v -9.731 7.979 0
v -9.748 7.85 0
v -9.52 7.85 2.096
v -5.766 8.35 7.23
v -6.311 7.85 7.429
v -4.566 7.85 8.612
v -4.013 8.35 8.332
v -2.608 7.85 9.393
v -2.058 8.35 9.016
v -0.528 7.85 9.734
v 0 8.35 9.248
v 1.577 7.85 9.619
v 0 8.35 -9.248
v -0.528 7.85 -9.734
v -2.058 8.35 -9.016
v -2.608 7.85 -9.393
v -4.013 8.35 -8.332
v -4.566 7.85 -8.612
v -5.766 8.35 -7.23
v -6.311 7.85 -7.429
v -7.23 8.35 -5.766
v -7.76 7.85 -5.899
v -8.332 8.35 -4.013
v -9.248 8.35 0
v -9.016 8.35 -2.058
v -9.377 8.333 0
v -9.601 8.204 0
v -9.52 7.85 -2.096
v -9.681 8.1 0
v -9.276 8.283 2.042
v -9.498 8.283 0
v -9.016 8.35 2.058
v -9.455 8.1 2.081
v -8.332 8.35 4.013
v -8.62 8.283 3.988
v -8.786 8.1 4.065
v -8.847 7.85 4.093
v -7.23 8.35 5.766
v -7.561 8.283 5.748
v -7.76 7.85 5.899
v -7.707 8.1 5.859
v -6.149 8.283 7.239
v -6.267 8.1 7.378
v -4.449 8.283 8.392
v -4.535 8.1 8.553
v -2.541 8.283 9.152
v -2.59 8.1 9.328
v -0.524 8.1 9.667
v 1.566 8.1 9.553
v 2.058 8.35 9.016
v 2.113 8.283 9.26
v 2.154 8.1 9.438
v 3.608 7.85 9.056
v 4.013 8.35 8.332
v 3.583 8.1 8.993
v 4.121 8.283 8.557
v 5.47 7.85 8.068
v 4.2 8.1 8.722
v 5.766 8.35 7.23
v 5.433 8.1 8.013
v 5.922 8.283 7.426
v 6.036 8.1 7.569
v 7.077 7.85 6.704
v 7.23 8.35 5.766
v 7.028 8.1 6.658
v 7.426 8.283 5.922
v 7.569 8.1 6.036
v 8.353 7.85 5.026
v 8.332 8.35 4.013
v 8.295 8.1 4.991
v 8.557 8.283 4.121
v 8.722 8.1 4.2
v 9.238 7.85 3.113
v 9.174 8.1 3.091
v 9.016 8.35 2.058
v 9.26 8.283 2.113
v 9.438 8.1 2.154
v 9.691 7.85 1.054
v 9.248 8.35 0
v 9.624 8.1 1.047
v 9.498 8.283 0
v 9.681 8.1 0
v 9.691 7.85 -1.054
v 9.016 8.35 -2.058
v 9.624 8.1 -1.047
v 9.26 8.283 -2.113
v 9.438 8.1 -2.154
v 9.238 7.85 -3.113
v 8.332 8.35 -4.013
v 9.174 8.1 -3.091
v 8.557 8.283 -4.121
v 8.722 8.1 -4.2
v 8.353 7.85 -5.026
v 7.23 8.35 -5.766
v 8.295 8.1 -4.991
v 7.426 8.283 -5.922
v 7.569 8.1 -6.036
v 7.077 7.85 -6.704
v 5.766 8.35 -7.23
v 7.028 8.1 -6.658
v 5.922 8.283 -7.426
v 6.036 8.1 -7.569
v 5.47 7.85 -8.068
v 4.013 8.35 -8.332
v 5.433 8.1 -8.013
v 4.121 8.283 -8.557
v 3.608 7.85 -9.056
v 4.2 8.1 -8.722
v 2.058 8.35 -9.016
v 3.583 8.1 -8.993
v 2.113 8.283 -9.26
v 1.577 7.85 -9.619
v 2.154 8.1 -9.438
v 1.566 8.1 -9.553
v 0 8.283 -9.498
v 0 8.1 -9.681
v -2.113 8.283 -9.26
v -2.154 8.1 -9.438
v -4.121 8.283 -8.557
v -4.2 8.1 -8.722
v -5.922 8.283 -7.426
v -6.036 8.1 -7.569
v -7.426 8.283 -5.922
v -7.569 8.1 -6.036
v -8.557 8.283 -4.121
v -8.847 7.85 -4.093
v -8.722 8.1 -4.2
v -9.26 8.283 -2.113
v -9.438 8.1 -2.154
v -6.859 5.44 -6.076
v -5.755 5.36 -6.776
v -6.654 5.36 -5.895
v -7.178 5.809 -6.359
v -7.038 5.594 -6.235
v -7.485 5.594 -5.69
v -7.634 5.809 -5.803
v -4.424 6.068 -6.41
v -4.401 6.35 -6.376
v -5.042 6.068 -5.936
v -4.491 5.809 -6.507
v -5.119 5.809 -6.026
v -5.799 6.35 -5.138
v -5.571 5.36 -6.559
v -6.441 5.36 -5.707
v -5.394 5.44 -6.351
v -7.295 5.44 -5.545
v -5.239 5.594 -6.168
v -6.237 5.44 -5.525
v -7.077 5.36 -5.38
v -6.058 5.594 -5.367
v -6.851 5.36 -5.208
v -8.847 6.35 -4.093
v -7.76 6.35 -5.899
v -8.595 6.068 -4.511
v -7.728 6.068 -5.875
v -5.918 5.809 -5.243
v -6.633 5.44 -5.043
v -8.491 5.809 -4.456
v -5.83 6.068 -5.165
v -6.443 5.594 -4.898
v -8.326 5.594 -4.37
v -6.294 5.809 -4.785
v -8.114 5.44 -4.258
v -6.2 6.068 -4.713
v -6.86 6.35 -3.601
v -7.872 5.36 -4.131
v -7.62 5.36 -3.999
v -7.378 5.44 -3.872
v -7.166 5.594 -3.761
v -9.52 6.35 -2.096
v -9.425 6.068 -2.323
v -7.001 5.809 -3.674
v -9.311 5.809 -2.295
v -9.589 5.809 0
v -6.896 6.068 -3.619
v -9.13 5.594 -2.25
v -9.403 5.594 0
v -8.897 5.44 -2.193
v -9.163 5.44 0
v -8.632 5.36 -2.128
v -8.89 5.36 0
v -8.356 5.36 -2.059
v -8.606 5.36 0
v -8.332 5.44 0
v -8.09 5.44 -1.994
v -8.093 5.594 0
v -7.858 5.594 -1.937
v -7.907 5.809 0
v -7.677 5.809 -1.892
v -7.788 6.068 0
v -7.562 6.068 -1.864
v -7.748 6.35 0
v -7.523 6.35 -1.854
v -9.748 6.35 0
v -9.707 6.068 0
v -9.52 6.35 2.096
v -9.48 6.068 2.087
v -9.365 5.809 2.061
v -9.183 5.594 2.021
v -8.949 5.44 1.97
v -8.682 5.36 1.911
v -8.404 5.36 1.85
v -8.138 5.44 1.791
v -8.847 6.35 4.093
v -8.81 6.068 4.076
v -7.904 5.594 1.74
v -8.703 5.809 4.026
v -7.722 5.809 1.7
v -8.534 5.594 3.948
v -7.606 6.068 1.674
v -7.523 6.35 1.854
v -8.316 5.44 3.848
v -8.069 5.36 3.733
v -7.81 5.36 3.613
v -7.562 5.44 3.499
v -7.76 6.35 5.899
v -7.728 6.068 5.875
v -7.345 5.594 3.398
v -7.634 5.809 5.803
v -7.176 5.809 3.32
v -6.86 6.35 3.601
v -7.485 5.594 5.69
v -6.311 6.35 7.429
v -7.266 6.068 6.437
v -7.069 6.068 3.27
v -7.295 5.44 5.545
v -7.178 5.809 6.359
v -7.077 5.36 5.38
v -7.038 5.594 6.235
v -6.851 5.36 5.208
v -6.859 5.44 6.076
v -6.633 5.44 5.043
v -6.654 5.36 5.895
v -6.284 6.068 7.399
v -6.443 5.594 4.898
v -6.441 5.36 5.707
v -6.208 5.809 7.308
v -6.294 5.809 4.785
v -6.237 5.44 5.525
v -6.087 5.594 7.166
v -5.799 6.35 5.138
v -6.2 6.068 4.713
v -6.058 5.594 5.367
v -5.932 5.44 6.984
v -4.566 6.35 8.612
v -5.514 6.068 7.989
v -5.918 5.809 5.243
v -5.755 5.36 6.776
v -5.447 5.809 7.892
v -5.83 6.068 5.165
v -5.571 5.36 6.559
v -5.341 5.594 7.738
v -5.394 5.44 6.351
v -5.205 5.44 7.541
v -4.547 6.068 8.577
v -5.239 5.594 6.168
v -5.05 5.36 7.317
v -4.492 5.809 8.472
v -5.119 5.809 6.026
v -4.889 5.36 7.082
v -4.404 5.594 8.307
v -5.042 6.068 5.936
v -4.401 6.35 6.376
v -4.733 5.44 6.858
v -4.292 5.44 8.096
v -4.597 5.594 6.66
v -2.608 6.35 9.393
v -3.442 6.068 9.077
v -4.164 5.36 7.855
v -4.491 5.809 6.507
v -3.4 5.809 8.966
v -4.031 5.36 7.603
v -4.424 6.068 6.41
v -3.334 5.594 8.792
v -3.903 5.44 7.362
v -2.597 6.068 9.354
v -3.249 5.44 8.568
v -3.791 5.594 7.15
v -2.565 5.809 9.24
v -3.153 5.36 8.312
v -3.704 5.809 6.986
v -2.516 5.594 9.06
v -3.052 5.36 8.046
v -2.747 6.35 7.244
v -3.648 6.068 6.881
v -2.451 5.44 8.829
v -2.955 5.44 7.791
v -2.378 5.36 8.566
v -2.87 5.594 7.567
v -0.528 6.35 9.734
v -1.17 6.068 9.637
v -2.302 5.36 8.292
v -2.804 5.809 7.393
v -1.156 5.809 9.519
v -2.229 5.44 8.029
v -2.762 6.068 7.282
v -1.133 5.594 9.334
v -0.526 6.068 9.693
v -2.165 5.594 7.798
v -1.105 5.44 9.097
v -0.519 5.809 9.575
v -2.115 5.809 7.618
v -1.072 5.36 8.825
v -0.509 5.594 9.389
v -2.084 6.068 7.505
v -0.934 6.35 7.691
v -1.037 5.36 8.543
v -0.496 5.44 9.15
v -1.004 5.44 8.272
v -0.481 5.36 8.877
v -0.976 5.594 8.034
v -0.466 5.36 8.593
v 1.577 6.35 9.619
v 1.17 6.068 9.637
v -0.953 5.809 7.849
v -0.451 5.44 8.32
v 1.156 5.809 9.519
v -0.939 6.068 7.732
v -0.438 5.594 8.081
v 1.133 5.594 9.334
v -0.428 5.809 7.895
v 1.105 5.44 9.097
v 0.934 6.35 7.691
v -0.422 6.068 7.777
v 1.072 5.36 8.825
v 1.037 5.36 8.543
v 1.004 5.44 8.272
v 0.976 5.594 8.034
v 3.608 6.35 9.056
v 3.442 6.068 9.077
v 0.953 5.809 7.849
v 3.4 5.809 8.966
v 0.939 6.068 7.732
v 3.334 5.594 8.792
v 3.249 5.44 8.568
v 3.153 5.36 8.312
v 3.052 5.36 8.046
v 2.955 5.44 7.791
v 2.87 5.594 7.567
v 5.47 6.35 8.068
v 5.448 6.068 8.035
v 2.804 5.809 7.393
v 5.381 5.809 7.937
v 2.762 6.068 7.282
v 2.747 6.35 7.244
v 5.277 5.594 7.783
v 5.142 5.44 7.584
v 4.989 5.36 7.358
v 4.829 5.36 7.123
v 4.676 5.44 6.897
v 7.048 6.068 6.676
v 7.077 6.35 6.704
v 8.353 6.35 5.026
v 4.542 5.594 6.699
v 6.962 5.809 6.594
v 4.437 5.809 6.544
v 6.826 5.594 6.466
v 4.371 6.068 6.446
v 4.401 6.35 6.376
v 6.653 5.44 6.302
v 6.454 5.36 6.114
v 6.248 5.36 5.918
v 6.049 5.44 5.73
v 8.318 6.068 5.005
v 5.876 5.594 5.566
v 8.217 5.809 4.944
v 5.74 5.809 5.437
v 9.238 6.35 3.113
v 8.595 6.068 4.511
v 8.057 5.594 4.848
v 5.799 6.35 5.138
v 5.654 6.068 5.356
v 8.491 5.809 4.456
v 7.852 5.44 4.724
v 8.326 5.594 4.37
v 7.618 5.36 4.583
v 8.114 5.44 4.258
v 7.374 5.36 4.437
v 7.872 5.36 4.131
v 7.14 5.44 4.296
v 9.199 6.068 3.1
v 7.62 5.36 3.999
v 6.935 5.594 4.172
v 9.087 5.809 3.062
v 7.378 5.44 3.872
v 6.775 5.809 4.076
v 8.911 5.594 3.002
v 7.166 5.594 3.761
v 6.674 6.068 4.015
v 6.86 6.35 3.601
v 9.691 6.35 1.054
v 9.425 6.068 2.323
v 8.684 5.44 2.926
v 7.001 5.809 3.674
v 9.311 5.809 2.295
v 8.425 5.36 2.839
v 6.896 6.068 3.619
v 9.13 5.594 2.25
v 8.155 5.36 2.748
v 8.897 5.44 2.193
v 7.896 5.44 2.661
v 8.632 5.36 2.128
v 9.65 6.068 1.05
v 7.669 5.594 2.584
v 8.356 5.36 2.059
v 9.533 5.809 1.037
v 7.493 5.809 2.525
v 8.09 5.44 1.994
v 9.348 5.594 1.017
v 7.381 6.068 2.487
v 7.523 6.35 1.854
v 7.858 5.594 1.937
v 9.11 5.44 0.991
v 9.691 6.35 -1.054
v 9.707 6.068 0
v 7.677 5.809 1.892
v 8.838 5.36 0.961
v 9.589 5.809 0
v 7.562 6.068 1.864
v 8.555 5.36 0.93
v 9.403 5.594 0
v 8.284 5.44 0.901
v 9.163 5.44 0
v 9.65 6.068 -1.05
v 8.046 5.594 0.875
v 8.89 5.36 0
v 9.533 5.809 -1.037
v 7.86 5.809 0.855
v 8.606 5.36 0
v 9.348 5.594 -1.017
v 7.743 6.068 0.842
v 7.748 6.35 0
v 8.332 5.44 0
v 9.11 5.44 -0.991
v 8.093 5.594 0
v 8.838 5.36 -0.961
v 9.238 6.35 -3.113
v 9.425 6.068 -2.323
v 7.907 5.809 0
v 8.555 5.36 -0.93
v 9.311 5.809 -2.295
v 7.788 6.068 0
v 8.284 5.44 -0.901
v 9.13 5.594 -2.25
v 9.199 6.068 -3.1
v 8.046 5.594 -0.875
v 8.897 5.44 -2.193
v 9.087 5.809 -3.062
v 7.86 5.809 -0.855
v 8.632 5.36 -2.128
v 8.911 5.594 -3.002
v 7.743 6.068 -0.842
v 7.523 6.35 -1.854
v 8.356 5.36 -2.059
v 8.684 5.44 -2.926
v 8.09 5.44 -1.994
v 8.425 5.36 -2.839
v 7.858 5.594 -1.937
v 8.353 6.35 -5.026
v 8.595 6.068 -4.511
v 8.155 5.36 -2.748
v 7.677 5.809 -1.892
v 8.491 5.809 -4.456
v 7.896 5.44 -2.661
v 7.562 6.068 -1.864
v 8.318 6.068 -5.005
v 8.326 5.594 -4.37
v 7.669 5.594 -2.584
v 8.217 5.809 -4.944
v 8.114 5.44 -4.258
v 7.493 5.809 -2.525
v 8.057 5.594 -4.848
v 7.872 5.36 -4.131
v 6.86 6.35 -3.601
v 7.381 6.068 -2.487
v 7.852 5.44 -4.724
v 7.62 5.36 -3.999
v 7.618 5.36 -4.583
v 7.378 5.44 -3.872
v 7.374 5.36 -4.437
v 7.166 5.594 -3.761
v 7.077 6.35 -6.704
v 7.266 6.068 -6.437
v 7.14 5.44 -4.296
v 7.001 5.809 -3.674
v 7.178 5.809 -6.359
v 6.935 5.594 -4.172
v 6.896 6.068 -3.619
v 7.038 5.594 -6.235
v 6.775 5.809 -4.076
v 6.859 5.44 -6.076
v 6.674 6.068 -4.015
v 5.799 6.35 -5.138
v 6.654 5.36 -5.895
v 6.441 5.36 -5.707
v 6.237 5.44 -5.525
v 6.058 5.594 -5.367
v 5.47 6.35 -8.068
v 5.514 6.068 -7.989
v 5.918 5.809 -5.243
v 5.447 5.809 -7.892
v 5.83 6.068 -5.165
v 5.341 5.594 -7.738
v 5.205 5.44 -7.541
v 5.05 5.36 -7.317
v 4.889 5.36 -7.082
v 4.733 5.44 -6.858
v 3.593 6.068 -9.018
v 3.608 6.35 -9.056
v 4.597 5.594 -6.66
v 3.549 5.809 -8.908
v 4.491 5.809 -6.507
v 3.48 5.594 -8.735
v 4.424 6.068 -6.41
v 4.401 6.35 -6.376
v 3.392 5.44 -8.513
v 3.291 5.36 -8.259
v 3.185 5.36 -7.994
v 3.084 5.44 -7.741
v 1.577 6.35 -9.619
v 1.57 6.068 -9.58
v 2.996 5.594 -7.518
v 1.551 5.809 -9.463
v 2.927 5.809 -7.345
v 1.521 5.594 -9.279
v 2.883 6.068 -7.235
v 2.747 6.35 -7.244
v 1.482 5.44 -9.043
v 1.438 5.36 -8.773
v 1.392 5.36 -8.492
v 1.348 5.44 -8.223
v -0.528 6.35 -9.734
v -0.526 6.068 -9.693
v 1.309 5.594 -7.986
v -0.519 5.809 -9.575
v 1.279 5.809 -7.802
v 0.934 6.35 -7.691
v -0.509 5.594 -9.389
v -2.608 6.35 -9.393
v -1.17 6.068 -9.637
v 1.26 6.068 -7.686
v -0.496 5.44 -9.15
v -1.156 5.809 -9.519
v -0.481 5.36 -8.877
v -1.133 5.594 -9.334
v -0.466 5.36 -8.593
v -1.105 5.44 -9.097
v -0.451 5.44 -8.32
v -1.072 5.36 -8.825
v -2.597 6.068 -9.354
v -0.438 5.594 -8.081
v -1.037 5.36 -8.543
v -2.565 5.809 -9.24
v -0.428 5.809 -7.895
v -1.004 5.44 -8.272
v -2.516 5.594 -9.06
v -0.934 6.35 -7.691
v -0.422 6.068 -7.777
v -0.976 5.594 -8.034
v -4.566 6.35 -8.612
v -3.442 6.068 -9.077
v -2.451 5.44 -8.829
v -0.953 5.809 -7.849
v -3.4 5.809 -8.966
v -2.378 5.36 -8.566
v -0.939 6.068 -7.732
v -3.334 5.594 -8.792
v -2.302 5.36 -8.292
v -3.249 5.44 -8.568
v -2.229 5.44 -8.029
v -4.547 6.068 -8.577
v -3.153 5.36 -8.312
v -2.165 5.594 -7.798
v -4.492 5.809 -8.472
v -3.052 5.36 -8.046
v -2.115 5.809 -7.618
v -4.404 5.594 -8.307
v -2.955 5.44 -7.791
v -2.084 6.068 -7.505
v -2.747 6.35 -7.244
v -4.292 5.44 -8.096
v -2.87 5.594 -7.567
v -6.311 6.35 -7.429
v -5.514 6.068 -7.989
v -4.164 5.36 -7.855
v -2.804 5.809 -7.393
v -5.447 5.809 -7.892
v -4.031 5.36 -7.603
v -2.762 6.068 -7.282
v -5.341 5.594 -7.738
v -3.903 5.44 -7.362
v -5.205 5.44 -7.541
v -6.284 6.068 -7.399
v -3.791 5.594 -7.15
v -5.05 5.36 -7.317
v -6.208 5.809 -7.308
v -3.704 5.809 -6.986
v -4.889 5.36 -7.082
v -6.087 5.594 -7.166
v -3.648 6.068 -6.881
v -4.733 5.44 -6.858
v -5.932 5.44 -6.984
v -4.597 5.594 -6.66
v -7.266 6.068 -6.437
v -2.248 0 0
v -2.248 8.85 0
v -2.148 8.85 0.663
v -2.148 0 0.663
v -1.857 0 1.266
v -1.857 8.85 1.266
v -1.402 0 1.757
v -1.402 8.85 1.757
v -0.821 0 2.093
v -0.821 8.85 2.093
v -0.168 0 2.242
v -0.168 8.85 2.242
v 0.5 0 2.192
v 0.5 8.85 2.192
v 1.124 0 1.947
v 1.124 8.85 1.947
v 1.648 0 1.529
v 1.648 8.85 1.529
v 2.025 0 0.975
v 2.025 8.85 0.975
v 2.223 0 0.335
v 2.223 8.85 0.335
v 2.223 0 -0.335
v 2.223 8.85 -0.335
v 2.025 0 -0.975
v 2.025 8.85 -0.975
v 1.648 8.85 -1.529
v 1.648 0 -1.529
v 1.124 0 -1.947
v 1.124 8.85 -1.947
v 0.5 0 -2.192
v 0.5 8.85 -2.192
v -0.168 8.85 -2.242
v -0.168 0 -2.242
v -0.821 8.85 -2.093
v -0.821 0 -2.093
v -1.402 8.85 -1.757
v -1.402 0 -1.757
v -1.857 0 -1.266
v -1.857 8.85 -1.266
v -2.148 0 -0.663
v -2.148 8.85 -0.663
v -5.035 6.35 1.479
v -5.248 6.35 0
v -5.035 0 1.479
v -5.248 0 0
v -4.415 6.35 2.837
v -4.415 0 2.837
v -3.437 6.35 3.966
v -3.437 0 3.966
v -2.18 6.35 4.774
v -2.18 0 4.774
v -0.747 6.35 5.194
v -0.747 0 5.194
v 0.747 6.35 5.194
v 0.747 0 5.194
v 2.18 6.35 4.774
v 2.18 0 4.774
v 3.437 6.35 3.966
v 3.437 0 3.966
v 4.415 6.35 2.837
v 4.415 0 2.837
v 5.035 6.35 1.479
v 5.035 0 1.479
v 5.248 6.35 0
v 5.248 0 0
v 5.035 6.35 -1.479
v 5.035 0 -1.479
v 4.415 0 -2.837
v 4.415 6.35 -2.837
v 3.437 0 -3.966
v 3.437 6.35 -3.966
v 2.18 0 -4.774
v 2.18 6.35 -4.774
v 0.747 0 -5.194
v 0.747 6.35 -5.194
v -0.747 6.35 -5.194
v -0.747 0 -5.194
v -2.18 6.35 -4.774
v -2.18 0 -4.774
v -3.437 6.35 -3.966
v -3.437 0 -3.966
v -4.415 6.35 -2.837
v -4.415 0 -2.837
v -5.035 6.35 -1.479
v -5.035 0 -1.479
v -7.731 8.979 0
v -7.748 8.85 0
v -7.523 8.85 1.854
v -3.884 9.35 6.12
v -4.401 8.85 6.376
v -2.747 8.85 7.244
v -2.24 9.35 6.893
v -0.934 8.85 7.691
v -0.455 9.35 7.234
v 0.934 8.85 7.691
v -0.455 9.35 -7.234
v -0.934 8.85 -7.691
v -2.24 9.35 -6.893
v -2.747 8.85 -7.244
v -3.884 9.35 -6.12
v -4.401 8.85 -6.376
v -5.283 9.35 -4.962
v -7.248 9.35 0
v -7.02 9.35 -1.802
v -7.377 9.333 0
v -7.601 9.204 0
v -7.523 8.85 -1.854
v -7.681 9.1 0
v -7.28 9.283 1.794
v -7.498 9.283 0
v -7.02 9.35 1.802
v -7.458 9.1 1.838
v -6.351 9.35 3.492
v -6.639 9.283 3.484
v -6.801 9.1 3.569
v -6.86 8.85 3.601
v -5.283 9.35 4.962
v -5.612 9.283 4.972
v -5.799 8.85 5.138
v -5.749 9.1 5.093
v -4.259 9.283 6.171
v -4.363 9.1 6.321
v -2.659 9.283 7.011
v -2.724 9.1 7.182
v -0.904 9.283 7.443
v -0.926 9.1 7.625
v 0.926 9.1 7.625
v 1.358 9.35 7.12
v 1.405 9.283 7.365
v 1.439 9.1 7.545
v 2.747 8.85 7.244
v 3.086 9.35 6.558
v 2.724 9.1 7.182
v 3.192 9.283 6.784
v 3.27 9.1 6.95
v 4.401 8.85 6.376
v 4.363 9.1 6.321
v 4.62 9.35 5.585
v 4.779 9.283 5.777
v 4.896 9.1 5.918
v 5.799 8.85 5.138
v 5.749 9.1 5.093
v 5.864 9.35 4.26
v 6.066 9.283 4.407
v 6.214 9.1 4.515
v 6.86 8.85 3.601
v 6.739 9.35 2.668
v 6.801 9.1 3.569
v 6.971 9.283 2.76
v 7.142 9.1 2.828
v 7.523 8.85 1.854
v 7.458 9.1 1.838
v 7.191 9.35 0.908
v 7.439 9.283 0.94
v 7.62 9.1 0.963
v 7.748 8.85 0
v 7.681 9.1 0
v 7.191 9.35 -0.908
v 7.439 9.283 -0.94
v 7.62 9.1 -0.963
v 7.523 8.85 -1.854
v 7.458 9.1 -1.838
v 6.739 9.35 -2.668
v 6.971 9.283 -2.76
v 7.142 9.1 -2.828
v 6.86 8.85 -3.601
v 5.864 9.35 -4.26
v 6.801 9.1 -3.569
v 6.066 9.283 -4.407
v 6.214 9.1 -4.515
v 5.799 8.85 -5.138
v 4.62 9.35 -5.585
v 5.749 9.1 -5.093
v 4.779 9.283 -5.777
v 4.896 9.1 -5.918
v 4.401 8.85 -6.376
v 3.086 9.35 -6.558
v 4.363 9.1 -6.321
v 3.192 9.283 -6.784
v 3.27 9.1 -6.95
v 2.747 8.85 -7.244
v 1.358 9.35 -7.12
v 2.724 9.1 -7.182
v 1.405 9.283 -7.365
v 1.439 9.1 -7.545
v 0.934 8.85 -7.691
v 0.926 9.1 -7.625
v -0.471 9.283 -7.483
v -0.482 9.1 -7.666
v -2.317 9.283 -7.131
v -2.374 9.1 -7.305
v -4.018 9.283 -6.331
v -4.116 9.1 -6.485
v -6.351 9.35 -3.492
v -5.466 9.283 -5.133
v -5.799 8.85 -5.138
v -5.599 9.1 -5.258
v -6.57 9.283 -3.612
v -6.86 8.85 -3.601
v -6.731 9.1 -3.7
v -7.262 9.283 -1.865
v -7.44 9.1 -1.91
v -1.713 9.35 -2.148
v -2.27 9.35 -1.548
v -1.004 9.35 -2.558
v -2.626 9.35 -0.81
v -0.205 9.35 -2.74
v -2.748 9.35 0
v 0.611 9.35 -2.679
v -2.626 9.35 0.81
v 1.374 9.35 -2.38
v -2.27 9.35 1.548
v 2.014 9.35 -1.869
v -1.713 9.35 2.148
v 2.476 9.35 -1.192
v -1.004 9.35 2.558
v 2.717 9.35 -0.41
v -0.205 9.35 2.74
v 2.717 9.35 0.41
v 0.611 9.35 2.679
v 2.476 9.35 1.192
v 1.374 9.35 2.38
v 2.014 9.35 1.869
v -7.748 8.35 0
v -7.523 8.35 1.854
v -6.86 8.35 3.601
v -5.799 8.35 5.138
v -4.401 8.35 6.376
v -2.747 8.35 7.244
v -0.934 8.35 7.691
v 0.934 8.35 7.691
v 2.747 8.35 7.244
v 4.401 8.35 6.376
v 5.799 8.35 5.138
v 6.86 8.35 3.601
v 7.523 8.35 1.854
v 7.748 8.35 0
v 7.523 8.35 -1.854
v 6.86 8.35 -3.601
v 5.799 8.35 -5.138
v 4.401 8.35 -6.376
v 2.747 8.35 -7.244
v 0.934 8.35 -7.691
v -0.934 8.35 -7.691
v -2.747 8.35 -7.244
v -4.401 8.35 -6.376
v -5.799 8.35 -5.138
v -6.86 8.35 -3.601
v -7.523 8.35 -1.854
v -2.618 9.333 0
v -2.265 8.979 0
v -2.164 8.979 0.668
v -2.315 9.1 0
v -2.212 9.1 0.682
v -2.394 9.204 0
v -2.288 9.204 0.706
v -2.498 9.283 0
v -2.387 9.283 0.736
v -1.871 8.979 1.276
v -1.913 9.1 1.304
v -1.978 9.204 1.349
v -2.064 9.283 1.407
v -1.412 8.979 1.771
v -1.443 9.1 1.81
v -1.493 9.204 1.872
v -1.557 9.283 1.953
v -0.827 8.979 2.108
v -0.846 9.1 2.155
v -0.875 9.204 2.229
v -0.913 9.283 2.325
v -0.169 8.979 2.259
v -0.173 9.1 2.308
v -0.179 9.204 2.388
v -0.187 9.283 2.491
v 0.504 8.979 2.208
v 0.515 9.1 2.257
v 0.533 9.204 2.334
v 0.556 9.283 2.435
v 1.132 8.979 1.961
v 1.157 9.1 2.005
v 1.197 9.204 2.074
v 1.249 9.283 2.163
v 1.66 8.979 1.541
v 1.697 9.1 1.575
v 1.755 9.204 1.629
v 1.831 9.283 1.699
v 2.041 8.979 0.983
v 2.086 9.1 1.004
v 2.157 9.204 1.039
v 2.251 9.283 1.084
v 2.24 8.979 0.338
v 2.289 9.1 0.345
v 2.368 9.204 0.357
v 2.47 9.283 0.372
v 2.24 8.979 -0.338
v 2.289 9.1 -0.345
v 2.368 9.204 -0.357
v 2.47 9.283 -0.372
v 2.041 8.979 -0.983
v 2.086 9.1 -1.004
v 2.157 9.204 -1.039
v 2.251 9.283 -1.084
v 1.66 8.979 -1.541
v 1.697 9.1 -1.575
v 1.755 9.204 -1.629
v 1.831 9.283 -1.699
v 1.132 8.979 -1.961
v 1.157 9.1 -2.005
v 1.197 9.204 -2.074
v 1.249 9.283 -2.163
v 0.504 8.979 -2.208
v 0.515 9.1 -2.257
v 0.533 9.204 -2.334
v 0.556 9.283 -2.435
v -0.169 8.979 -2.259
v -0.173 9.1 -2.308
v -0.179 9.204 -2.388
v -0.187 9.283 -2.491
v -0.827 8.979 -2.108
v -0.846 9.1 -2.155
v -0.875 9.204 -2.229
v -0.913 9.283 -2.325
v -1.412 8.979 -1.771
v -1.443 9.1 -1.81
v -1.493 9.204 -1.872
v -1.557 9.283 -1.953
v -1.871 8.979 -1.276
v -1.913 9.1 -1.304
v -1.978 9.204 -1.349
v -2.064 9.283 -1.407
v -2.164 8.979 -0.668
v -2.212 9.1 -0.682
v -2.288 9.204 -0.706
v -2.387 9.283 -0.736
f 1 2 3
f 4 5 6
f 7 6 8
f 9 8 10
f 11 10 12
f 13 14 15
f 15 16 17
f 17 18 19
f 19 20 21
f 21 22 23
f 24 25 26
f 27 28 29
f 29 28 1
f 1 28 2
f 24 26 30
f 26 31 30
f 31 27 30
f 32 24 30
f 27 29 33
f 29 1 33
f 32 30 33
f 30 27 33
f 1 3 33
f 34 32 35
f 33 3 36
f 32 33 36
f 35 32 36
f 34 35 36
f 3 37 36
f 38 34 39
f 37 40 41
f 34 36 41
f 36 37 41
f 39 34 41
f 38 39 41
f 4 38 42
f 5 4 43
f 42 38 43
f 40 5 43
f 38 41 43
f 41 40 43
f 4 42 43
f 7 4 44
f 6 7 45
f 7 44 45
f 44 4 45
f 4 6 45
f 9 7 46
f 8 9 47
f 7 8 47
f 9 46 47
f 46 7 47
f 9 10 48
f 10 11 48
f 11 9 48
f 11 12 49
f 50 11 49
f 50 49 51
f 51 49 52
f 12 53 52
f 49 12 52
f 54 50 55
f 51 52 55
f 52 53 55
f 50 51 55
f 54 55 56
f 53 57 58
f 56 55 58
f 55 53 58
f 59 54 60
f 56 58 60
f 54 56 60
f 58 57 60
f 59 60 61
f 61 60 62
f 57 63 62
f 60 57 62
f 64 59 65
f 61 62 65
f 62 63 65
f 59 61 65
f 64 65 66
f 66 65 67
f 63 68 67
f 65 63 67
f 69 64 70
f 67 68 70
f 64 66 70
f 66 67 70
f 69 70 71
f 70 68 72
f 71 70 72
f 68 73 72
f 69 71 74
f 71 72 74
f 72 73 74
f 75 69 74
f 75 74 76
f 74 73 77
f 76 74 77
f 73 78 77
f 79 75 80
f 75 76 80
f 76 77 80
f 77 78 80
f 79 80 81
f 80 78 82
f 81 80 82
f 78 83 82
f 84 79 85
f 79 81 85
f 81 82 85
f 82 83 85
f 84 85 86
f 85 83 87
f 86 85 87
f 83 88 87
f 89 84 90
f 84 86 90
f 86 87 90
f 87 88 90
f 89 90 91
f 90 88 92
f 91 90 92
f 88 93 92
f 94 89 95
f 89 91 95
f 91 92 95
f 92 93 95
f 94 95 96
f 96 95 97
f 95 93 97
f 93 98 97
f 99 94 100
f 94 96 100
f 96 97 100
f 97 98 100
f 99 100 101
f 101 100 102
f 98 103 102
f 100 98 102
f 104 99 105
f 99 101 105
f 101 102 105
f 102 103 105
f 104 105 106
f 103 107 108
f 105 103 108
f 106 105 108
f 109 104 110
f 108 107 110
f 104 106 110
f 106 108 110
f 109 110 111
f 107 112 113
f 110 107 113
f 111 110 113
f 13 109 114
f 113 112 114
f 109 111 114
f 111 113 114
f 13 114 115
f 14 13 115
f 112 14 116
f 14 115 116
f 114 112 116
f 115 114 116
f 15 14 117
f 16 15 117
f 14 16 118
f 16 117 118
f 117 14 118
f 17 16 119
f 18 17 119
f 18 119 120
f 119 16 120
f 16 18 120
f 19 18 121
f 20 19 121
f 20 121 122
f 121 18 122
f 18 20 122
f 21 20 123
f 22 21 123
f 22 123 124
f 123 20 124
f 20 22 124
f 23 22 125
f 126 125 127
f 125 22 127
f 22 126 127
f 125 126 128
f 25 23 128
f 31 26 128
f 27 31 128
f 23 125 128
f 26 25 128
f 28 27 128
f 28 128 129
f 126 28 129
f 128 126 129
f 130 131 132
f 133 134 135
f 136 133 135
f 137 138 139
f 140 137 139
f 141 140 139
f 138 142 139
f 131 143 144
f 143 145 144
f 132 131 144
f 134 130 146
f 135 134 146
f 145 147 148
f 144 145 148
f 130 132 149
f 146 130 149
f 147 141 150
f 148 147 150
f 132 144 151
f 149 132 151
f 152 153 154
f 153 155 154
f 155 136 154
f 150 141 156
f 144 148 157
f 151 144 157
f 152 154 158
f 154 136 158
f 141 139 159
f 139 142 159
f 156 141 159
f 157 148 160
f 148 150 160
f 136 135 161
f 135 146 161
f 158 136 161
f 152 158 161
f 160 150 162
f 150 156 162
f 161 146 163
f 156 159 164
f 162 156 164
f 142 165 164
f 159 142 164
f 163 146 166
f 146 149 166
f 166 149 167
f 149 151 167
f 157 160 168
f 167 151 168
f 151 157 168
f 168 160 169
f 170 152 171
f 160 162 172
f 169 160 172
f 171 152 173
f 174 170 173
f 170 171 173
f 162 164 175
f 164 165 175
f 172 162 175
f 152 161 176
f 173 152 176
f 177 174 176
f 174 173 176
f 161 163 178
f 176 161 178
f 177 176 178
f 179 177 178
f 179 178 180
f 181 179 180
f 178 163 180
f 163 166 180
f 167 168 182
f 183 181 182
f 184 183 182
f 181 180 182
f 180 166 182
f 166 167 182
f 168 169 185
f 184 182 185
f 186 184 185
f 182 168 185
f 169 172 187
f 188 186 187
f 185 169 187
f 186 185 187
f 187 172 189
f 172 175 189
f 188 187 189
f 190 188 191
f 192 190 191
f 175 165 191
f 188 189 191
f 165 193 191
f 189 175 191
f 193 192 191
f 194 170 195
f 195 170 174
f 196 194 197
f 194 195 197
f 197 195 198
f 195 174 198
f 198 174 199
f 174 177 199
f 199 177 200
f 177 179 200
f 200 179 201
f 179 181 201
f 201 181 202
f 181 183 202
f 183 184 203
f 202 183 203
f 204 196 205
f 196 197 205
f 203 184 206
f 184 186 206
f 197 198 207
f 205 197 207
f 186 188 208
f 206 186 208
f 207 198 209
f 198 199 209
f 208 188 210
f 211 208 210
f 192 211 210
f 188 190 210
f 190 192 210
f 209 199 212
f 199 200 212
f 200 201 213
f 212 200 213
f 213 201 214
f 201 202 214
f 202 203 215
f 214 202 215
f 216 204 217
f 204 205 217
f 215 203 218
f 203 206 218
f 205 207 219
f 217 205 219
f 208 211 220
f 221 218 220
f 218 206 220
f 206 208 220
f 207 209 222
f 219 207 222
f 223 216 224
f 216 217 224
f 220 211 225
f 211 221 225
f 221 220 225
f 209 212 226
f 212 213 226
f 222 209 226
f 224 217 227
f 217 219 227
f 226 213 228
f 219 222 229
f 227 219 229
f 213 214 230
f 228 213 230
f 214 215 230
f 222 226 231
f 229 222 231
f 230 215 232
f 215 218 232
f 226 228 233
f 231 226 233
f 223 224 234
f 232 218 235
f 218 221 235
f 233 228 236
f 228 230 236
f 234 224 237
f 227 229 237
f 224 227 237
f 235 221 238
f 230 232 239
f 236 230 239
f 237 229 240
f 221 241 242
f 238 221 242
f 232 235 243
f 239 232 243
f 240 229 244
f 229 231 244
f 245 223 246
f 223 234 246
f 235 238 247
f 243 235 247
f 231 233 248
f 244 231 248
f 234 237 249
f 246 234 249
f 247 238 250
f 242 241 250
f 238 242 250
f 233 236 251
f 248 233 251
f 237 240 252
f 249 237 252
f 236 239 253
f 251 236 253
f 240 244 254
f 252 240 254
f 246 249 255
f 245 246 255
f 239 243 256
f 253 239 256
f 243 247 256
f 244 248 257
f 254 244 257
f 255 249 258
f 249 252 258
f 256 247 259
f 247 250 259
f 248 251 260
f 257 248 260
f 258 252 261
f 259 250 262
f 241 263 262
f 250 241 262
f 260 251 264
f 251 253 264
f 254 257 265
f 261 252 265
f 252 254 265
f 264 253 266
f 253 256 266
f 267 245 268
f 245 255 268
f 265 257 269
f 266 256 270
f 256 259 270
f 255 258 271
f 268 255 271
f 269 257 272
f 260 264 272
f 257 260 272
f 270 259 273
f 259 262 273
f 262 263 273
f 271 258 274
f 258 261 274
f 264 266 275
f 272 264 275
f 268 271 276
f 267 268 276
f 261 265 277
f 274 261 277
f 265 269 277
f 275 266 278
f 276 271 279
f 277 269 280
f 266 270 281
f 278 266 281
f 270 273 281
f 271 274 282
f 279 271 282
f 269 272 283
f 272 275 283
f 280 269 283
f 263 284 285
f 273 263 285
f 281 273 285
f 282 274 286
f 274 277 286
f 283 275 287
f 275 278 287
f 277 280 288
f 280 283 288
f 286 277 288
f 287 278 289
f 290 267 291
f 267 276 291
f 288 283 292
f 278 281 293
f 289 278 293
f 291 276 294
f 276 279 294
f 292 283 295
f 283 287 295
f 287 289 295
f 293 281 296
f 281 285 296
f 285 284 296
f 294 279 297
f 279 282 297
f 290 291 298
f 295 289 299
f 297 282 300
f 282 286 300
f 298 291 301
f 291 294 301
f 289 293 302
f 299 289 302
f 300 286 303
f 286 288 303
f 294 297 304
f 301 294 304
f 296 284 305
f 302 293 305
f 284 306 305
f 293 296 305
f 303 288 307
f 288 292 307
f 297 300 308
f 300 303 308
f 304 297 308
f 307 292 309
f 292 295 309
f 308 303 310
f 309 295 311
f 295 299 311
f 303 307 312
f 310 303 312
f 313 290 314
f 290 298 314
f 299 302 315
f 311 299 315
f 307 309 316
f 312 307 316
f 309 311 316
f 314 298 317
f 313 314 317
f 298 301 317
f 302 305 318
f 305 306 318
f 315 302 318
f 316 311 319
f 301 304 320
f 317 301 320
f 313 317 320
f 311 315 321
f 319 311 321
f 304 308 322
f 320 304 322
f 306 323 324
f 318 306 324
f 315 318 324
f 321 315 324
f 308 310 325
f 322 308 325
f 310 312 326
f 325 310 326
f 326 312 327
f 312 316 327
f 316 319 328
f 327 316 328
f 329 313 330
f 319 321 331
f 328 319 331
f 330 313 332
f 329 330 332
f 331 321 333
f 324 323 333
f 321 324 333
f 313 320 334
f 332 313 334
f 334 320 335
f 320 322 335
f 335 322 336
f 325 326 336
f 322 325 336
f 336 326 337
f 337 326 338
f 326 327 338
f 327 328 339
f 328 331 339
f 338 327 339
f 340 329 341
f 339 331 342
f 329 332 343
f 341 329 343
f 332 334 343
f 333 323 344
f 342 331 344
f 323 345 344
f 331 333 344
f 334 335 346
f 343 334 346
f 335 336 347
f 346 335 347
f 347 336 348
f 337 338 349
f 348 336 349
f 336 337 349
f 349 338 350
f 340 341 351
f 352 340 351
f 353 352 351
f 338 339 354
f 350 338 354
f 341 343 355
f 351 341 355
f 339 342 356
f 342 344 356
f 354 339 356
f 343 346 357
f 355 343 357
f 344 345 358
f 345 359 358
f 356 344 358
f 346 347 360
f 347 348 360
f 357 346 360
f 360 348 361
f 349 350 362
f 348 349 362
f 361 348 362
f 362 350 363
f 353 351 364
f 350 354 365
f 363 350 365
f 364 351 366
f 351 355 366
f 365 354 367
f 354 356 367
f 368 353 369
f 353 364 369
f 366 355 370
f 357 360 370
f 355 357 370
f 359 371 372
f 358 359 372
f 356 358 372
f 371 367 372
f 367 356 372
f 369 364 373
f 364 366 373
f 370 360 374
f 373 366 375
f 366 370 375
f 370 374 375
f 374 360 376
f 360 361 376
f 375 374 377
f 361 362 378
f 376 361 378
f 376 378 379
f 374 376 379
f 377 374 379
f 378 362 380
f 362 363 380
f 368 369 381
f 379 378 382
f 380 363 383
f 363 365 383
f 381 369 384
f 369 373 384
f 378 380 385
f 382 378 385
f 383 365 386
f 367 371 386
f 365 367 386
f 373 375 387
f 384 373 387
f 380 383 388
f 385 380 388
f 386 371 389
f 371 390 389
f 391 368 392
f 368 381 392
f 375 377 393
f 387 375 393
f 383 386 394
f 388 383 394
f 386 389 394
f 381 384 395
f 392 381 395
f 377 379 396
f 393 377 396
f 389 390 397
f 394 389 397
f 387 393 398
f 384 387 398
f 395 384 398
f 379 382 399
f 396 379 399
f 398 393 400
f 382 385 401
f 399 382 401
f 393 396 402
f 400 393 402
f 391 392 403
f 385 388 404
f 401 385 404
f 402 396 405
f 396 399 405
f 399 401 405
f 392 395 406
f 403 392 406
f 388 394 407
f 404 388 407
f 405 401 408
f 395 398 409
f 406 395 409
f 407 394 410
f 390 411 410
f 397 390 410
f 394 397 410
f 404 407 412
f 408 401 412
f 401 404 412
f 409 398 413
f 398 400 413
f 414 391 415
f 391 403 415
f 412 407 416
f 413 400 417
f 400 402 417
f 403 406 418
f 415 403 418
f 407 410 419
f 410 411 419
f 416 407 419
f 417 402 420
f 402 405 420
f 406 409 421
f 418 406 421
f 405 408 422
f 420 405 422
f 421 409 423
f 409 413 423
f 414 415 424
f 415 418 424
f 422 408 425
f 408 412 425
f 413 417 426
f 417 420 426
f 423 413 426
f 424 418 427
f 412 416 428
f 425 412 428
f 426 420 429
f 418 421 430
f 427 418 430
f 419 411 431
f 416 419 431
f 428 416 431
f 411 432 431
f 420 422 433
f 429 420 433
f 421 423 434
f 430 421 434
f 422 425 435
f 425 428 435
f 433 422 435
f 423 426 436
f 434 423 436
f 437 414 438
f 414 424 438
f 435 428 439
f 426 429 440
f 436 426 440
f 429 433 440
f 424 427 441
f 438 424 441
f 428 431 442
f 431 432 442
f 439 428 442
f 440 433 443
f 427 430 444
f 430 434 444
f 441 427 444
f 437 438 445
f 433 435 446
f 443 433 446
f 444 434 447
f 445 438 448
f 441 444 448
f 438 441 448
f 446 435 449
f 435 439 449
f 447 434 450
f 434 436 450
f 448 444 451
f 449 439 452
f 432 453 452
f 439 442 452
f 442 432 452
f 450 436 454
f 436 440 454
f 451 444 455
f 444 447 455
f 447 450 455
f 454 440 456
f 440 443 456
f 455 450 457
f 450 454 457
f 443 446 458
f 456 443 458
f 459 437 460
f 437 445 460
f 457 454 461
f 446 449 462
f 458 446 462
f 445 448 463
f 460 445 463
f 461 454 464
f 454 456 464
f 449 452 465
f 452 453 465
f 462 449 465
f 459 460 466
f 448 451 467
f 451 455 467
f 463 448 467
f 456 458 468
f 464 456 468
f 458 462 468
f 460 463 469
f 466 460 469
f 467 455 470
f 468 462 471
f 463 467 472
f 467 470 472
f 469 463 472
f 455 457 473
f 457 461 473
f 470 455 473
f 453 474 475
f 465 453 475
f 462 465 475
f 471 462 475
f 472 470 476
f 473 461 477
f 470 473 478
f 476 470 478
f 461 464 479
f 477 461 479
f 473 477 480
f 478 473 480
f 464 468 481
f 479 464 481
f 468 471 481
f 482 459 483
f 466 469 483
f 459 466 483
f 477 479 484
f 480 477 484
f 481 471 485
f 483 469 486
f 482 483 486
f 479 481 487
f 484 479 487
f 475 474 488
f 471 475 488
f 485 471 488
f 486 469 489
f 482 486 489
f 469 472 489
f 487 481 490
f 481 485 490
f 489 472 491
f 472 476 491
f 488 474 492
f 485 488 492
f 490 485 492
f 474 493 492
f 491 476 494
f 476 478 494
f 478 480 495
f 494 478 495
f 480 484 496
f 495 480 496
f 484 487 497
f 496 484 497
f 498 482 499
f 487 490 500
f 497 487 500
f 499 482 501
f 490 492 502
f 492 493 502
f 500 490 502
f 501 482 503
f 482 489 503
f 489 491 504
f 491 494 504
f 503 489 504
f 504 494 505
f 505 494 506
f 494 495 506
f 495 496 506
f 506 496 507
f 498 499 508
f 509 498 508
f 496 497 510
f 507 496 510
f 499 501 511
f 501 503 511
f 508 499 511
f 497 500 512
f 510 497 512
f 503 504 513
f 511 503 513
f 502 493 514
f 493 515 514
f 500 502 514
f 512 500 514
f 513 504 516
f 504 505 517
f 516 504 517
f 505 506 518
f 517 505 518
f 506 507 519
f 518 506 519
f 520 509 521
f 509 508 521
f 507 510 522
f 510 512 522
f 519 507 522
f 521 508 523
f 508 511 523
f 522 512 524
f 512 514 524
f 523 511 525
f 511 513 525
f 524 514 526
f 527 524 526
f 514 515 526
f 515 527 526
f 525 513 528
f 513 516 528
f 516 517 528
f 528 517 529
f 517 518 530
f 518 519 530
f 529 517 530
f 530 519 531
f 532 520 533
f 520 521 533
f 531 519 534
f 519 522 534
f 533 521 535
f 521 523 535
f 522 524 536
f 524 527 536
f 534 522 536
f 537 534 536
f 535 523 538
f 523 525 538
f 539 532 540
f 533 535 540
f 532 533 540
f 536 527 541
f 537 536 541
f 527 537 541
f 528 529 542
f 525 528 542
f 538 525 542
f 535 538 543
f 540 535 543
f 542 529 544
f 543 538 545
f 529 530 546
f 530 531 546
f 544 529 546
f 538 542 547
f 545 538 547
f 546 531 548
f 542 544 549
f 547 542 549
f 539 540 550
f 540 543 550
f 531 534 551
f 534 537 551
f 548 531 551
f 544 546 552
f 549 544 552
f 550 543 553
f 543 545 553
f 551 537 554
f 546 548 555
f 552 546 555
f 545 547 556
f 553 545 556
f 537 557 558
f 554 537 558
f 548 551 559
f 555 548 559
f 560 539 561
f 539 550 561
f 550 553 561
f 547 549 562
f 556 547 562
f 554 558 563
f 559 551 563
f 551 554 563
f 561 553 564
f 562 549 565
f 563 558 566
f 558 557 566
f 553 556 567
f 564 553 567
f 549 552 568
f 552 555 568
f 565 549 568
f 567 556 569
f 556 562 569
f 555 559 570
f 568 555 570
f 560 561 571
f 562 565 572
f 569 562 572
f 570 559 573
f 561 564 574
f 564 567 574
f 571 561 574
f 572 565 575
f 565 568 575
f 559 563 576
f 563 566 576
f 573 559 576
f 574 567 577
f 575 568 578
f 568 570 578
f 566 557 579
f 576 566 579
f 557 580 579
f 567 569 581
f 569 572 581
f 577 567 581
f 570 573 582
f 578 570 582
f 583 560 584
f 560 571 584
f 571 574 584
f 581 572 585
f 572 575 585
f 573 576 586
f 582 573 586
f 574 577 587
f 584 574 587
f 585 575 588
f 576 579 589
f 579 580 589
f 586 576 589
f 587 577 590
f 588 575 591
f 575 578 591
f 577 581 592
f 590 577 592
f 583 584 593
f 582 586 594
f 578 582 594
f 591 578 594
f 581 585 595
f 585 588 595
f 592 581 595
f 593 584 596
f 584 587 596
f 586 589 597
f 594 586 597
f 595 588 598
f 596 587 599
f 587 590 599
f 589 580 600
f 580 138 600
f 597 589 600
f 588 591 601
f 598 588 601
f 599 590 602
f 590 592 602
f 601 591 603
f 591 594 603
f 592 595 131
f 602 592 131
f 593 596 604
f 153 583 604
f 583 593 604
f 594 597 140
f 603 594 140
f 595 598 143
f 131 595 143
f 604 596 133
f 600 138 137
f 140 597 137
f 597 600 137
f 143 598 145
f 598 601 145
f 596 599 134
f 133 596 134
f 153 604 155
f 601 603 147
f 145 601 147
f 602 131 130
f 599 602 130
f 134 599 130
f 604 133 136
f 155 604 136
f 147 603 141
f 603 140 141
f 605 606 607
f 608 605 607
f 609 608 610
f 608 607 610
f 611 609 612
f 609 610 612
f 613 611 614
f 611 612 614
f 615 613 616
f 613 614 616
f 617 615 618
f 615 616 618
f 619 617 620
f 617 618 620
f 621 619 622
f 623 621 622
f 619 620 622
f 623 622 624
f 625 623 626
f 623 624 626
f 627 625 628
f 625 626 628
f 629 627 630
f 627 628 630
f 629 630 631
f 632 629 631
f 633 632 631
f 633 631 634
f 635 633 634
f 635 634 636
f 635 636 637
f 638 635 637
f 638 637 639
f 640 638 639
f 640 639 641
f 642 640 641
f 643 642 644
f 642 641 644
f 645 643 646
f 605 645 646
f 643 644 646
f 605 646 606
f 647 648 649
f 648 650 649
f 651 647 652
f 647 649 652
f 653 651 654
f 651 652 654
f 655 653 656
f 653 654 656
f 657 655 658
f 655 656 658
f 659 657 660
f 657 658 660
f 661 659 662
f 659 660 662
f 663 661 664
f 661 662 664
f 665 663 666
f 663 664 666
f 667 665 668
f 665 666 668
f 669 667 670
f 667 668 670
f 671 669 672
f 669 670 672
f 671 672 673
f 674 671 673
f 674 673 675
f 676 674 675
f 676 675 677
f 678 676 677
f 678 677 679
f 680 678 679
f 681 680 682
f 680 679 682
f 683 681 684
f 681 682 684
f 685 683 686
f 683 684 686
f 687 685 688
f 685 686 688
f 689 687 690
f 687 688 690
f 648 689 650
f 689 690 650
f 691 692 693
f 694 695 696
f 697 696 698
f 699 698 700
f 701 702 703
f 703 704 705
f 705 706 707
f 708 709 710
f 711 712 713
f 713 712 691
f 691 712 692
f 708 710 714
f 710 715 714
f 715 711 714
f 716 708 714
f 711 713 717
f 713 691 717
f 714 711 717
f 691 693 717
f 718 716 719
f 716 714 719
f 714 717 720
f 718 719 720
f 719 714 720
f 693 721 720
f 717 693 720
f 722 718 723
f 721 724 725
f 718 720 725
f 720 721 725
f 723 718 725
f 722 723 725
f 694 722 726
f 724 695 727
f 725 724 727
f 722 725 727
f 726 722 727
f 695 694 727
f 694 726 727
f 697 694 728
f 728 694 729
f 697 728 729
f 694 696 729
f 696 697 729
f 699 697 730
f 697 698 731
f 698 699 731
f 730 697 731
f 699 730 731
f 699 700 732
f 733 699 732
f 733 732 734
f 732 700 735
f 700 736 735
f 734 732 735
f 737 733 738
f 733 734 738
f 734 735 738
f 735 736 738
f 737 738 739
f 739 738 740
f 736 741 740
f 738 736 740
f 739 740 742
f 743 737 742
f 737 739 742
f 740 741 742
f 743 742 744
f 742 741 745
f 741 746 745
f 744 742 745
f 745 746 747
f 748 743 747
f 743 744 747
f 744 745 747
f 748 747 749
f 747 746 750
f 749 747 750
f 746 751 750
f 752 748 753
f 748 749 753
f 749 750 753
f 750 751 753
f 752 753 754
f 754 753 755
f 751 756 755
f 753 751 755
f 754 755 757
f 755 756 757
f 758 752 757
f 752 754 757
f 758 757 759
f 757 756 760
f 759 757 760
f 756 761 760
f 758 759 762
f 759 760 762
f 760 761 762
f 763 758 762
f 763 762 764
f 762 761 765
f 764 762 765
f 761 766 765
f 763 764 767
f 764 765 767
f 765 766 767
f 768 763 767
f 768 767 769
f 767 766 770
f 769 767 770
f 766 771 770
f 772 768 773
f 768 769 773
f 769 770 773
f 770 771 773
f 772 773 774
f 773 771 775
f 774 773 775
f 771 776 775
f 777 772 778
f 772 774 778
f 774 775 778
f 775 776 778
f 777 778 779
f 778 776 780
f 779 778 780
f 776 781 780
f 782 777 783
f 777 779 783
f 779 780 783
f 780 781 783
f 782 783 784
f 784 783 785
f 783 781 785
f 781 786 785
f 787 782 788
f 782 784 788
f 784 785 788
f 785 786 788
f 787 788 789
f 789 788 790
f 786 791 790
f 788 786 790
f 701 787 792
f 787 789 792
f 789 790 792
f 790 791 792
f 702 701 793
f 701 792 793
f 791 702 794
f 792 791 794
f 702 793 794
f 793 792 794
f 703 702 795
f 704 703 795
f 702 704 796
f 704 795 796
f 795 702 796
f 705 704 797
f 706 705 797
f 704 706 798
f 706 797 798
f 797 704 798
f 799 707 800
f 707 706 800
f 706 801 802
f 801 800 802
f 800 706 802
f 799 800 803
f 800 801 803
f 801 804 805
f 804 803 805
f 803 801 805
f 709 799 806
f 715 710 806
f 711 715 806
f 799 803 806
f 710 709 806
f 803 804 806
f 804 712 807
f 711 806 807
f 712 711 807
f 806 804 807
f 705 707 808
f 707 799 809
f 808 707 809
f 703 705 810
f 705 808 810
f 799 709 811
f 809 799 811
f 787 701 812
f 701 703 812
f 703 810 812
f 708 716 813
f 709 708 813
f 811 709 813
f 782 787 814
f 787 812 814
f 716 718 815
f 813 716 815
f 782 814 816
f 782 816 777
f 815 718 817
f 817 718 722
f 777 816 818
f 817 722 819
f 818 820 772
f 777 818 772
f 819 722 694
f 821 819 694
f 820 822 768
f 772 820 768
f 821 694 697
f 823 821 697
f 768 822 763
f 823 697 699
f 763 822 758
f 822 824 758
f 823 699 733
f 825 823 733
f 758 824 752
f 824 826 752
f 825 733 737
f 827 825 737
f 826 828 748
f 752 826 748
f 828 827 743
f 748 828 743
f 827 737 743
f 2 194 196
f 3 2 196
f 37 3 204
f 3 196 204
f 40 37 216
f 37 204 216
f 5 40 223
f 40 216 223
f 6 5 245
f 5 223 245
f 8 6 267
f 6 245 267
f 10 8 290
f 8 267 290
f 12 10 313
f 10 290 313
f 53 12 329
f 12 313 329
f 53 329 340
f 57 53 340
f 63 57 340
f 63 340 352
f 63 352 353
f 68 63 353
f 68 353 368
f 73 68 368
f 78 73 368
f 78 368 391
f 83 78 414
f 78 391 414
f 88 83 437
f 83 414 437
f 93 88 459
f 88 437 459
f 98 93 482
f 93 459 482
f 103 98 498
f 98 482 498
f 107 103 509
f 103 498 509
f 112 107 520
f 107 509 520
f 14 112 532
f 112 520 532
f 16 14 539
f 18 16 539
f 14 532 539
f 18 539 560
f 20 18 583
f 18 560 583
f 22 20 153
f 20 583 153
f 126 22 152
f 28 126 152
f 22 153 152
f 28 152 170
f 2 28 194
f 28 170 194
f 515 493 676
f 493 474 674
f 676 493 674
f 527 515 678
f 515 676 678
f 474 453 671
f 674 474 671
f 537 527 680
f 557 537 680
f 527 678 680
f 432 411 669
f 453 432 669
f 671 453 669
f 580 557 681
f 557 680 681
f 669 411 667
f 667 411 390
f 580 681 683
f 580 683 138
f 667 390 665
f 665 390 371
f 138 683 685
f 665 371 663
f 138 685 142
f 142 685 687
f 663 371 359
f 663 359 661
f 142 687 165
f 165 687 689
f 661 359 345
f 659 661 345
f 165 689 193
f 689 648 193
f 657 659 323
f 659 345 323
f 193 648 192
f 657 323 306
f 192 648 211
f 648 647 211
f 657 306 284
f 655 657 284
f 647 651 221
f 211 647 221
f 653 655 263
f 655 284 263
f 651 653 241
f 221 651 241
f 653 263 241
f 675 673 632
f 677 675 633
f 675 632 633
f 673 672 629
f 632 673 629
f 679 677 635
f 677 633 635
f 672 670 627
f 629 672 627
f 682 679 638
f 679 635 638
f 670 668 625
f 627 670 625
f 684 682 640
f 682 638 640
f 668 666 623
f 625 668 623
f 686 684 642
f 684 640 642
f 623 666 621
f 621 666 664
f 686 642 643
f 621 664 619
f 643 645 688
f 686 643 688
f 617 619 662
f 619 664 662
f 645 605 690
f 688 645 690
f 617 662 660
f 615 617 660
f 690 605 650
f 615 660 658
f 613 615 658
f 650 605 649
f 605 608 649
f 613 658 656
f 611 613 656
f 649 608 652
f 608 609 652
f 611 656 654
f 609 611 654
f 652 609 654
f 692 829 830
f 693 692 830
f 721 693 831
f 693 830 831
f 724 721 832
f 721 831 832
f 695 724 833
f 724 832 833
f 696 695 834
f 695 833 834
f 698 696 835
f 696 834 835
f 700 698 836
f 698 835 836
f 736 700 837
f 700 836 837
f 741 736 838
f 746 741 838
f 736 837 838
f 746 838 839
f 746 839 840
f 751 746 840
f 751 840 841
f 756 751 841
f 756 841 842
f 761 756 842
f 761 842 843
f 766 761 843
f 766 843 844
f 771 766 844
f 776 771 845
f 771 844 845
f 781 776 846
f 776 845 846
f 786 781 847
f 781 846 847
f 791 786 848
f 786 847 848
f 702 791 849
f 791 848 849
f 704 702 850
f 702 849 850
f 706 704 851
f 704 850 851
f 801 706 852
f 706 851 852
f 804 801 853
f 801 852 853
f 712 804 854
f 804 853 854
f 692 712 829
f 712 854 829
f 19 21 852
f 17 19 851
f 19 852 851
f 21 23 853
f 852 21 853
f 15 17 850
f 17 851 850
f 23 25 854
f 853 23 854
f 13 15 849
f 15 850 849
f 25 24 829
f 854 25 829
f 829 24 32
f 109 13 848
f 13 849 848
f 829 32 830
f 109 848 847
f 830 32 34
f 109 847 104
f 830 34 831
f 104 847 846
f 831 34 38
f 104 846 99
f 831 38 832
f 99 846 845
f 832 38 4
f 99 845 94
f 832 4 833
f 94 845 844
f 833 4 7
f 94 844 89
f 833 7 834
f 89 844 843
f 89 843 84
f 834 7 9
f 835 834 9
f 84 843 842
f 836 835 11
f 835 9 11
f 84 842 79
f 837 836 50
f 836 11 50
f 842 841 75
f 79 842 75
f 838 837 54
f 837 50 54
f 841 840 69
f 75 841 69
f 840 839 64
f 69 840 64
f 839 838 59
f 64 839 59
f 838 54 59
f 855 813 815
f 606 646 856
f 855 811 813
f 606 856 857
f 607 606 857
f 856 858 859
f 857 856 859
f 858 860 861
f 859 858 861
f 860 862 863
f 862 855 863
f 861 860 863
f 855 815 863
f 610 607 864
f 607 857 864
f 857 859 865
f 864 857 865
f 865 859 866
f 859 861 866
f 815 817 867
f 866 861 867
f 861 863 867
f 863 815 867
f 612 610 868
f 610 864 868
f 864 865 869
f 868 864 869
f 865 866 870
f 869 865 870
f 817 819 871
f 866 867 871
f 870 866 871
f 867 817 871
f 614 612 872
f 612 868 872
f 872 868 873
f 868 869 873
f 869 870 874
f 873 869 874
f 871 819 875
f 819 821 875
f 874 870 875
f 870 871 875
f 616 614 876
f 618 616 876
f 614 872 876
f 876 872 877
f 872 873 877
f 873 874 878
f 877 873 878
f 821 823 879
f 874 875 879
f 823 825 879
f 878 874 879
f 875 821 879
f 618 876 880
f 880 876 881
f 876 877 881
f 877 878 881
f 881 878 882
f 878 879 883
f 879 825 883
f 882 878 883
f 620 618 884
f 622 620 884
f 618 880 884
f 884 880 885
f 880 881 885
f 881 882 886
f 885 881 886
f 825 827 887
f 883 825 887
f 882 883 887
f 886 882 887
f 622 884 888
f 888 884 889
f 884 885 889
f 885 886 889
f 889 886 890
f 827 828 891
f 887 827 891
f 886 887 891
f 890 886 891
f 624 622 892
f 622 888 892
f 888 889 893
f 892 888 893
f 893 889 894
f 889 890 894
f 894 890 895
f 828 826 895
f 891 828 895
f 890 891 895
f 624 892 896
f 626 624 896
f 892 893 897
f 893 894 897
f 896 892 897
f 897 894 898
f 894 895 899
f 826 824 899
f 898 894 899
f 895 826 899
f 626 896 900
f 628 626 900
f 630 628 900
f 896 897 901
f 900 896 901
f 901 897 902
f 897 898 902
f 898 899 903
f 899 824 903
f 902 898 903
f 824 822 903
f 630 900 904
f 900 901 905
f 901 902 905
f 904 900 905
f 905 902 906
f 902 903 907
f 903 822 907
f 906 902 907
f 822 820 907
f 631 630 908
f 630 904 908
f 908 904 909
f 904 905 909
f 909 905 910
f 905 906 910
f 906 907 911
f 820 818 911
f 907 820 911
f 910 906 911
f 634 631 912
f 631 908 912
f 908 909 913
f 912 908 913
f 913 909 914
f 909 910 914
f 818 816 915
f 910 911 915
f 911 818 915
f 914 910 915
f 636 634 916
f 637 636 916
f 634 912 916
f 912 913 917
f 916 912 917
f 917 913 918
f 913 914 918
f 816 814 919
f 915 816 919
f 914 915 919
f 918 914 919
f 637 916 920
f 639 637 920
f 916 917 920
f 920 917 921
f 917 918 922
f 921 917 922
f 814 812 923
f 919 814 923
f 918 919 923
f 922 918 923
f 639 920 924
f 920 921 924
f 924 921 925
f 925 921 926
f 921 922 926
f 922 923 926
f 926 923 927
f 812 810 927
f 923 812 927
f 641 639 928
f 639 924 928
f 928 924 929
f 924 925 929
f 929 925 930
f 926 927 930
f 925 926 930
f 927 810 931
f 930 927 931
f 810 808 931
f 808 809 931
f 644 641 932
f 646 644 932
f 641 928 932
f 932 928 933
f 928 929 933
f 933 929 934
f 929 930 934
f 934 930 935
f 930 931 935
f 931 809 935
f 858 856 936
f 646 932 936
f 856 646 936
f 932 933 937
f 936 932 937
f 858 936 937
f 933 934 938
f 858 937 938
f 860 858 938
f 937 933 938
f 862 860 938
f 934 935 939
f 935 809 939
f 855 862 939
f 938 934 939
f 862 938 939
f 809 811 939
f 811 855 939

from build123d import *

# Parameters (mm, degrees)
FILLET1_R = 0.5


with BuildPart() as part:
    # Sketch1 → Revolve1 (revolve)
    with BuildSketch(Plane.XY):
        with BuildLine():
            Line((-2.2479, 0), (-2.2479, 9.35))
            Line((-2.2479, 9.35), (-7.7479, 9.35))
            Line((-7.7479, 9.35), (-7.7479, 8.35))
            Line((-7.7479, 8.35), (-9.7479, 8.35))
            Line((-9.7479, 8.35), (-9.7479, 6.35))
            ThreePointArc((-9.7479, 6.35), (-8.7479, 5.35), (-7.7479, 6.35))
            Line((-7.7479, 6.35), (-5.2479, 6.35))
            Line((-5.2479, 6.35), (-5.2479, 0))
            Line((-5.2479, 0), (-2.2479, 0))
        make_face()
    revolve(axis=Axis((0, 0, 0), (0, 1, 0)))

    # Fillet1
    fillet1_edges = [part.edges().sort_by_distance(p)[0] for p in [
        (7.7479, 9.35, 0),
        (2.2479, 9.35, 0),
        (9.7479, 8.35, 0),
    ]]
    fillet(fillet1_edges, radius=FILLET1_R)


solid = part.part
